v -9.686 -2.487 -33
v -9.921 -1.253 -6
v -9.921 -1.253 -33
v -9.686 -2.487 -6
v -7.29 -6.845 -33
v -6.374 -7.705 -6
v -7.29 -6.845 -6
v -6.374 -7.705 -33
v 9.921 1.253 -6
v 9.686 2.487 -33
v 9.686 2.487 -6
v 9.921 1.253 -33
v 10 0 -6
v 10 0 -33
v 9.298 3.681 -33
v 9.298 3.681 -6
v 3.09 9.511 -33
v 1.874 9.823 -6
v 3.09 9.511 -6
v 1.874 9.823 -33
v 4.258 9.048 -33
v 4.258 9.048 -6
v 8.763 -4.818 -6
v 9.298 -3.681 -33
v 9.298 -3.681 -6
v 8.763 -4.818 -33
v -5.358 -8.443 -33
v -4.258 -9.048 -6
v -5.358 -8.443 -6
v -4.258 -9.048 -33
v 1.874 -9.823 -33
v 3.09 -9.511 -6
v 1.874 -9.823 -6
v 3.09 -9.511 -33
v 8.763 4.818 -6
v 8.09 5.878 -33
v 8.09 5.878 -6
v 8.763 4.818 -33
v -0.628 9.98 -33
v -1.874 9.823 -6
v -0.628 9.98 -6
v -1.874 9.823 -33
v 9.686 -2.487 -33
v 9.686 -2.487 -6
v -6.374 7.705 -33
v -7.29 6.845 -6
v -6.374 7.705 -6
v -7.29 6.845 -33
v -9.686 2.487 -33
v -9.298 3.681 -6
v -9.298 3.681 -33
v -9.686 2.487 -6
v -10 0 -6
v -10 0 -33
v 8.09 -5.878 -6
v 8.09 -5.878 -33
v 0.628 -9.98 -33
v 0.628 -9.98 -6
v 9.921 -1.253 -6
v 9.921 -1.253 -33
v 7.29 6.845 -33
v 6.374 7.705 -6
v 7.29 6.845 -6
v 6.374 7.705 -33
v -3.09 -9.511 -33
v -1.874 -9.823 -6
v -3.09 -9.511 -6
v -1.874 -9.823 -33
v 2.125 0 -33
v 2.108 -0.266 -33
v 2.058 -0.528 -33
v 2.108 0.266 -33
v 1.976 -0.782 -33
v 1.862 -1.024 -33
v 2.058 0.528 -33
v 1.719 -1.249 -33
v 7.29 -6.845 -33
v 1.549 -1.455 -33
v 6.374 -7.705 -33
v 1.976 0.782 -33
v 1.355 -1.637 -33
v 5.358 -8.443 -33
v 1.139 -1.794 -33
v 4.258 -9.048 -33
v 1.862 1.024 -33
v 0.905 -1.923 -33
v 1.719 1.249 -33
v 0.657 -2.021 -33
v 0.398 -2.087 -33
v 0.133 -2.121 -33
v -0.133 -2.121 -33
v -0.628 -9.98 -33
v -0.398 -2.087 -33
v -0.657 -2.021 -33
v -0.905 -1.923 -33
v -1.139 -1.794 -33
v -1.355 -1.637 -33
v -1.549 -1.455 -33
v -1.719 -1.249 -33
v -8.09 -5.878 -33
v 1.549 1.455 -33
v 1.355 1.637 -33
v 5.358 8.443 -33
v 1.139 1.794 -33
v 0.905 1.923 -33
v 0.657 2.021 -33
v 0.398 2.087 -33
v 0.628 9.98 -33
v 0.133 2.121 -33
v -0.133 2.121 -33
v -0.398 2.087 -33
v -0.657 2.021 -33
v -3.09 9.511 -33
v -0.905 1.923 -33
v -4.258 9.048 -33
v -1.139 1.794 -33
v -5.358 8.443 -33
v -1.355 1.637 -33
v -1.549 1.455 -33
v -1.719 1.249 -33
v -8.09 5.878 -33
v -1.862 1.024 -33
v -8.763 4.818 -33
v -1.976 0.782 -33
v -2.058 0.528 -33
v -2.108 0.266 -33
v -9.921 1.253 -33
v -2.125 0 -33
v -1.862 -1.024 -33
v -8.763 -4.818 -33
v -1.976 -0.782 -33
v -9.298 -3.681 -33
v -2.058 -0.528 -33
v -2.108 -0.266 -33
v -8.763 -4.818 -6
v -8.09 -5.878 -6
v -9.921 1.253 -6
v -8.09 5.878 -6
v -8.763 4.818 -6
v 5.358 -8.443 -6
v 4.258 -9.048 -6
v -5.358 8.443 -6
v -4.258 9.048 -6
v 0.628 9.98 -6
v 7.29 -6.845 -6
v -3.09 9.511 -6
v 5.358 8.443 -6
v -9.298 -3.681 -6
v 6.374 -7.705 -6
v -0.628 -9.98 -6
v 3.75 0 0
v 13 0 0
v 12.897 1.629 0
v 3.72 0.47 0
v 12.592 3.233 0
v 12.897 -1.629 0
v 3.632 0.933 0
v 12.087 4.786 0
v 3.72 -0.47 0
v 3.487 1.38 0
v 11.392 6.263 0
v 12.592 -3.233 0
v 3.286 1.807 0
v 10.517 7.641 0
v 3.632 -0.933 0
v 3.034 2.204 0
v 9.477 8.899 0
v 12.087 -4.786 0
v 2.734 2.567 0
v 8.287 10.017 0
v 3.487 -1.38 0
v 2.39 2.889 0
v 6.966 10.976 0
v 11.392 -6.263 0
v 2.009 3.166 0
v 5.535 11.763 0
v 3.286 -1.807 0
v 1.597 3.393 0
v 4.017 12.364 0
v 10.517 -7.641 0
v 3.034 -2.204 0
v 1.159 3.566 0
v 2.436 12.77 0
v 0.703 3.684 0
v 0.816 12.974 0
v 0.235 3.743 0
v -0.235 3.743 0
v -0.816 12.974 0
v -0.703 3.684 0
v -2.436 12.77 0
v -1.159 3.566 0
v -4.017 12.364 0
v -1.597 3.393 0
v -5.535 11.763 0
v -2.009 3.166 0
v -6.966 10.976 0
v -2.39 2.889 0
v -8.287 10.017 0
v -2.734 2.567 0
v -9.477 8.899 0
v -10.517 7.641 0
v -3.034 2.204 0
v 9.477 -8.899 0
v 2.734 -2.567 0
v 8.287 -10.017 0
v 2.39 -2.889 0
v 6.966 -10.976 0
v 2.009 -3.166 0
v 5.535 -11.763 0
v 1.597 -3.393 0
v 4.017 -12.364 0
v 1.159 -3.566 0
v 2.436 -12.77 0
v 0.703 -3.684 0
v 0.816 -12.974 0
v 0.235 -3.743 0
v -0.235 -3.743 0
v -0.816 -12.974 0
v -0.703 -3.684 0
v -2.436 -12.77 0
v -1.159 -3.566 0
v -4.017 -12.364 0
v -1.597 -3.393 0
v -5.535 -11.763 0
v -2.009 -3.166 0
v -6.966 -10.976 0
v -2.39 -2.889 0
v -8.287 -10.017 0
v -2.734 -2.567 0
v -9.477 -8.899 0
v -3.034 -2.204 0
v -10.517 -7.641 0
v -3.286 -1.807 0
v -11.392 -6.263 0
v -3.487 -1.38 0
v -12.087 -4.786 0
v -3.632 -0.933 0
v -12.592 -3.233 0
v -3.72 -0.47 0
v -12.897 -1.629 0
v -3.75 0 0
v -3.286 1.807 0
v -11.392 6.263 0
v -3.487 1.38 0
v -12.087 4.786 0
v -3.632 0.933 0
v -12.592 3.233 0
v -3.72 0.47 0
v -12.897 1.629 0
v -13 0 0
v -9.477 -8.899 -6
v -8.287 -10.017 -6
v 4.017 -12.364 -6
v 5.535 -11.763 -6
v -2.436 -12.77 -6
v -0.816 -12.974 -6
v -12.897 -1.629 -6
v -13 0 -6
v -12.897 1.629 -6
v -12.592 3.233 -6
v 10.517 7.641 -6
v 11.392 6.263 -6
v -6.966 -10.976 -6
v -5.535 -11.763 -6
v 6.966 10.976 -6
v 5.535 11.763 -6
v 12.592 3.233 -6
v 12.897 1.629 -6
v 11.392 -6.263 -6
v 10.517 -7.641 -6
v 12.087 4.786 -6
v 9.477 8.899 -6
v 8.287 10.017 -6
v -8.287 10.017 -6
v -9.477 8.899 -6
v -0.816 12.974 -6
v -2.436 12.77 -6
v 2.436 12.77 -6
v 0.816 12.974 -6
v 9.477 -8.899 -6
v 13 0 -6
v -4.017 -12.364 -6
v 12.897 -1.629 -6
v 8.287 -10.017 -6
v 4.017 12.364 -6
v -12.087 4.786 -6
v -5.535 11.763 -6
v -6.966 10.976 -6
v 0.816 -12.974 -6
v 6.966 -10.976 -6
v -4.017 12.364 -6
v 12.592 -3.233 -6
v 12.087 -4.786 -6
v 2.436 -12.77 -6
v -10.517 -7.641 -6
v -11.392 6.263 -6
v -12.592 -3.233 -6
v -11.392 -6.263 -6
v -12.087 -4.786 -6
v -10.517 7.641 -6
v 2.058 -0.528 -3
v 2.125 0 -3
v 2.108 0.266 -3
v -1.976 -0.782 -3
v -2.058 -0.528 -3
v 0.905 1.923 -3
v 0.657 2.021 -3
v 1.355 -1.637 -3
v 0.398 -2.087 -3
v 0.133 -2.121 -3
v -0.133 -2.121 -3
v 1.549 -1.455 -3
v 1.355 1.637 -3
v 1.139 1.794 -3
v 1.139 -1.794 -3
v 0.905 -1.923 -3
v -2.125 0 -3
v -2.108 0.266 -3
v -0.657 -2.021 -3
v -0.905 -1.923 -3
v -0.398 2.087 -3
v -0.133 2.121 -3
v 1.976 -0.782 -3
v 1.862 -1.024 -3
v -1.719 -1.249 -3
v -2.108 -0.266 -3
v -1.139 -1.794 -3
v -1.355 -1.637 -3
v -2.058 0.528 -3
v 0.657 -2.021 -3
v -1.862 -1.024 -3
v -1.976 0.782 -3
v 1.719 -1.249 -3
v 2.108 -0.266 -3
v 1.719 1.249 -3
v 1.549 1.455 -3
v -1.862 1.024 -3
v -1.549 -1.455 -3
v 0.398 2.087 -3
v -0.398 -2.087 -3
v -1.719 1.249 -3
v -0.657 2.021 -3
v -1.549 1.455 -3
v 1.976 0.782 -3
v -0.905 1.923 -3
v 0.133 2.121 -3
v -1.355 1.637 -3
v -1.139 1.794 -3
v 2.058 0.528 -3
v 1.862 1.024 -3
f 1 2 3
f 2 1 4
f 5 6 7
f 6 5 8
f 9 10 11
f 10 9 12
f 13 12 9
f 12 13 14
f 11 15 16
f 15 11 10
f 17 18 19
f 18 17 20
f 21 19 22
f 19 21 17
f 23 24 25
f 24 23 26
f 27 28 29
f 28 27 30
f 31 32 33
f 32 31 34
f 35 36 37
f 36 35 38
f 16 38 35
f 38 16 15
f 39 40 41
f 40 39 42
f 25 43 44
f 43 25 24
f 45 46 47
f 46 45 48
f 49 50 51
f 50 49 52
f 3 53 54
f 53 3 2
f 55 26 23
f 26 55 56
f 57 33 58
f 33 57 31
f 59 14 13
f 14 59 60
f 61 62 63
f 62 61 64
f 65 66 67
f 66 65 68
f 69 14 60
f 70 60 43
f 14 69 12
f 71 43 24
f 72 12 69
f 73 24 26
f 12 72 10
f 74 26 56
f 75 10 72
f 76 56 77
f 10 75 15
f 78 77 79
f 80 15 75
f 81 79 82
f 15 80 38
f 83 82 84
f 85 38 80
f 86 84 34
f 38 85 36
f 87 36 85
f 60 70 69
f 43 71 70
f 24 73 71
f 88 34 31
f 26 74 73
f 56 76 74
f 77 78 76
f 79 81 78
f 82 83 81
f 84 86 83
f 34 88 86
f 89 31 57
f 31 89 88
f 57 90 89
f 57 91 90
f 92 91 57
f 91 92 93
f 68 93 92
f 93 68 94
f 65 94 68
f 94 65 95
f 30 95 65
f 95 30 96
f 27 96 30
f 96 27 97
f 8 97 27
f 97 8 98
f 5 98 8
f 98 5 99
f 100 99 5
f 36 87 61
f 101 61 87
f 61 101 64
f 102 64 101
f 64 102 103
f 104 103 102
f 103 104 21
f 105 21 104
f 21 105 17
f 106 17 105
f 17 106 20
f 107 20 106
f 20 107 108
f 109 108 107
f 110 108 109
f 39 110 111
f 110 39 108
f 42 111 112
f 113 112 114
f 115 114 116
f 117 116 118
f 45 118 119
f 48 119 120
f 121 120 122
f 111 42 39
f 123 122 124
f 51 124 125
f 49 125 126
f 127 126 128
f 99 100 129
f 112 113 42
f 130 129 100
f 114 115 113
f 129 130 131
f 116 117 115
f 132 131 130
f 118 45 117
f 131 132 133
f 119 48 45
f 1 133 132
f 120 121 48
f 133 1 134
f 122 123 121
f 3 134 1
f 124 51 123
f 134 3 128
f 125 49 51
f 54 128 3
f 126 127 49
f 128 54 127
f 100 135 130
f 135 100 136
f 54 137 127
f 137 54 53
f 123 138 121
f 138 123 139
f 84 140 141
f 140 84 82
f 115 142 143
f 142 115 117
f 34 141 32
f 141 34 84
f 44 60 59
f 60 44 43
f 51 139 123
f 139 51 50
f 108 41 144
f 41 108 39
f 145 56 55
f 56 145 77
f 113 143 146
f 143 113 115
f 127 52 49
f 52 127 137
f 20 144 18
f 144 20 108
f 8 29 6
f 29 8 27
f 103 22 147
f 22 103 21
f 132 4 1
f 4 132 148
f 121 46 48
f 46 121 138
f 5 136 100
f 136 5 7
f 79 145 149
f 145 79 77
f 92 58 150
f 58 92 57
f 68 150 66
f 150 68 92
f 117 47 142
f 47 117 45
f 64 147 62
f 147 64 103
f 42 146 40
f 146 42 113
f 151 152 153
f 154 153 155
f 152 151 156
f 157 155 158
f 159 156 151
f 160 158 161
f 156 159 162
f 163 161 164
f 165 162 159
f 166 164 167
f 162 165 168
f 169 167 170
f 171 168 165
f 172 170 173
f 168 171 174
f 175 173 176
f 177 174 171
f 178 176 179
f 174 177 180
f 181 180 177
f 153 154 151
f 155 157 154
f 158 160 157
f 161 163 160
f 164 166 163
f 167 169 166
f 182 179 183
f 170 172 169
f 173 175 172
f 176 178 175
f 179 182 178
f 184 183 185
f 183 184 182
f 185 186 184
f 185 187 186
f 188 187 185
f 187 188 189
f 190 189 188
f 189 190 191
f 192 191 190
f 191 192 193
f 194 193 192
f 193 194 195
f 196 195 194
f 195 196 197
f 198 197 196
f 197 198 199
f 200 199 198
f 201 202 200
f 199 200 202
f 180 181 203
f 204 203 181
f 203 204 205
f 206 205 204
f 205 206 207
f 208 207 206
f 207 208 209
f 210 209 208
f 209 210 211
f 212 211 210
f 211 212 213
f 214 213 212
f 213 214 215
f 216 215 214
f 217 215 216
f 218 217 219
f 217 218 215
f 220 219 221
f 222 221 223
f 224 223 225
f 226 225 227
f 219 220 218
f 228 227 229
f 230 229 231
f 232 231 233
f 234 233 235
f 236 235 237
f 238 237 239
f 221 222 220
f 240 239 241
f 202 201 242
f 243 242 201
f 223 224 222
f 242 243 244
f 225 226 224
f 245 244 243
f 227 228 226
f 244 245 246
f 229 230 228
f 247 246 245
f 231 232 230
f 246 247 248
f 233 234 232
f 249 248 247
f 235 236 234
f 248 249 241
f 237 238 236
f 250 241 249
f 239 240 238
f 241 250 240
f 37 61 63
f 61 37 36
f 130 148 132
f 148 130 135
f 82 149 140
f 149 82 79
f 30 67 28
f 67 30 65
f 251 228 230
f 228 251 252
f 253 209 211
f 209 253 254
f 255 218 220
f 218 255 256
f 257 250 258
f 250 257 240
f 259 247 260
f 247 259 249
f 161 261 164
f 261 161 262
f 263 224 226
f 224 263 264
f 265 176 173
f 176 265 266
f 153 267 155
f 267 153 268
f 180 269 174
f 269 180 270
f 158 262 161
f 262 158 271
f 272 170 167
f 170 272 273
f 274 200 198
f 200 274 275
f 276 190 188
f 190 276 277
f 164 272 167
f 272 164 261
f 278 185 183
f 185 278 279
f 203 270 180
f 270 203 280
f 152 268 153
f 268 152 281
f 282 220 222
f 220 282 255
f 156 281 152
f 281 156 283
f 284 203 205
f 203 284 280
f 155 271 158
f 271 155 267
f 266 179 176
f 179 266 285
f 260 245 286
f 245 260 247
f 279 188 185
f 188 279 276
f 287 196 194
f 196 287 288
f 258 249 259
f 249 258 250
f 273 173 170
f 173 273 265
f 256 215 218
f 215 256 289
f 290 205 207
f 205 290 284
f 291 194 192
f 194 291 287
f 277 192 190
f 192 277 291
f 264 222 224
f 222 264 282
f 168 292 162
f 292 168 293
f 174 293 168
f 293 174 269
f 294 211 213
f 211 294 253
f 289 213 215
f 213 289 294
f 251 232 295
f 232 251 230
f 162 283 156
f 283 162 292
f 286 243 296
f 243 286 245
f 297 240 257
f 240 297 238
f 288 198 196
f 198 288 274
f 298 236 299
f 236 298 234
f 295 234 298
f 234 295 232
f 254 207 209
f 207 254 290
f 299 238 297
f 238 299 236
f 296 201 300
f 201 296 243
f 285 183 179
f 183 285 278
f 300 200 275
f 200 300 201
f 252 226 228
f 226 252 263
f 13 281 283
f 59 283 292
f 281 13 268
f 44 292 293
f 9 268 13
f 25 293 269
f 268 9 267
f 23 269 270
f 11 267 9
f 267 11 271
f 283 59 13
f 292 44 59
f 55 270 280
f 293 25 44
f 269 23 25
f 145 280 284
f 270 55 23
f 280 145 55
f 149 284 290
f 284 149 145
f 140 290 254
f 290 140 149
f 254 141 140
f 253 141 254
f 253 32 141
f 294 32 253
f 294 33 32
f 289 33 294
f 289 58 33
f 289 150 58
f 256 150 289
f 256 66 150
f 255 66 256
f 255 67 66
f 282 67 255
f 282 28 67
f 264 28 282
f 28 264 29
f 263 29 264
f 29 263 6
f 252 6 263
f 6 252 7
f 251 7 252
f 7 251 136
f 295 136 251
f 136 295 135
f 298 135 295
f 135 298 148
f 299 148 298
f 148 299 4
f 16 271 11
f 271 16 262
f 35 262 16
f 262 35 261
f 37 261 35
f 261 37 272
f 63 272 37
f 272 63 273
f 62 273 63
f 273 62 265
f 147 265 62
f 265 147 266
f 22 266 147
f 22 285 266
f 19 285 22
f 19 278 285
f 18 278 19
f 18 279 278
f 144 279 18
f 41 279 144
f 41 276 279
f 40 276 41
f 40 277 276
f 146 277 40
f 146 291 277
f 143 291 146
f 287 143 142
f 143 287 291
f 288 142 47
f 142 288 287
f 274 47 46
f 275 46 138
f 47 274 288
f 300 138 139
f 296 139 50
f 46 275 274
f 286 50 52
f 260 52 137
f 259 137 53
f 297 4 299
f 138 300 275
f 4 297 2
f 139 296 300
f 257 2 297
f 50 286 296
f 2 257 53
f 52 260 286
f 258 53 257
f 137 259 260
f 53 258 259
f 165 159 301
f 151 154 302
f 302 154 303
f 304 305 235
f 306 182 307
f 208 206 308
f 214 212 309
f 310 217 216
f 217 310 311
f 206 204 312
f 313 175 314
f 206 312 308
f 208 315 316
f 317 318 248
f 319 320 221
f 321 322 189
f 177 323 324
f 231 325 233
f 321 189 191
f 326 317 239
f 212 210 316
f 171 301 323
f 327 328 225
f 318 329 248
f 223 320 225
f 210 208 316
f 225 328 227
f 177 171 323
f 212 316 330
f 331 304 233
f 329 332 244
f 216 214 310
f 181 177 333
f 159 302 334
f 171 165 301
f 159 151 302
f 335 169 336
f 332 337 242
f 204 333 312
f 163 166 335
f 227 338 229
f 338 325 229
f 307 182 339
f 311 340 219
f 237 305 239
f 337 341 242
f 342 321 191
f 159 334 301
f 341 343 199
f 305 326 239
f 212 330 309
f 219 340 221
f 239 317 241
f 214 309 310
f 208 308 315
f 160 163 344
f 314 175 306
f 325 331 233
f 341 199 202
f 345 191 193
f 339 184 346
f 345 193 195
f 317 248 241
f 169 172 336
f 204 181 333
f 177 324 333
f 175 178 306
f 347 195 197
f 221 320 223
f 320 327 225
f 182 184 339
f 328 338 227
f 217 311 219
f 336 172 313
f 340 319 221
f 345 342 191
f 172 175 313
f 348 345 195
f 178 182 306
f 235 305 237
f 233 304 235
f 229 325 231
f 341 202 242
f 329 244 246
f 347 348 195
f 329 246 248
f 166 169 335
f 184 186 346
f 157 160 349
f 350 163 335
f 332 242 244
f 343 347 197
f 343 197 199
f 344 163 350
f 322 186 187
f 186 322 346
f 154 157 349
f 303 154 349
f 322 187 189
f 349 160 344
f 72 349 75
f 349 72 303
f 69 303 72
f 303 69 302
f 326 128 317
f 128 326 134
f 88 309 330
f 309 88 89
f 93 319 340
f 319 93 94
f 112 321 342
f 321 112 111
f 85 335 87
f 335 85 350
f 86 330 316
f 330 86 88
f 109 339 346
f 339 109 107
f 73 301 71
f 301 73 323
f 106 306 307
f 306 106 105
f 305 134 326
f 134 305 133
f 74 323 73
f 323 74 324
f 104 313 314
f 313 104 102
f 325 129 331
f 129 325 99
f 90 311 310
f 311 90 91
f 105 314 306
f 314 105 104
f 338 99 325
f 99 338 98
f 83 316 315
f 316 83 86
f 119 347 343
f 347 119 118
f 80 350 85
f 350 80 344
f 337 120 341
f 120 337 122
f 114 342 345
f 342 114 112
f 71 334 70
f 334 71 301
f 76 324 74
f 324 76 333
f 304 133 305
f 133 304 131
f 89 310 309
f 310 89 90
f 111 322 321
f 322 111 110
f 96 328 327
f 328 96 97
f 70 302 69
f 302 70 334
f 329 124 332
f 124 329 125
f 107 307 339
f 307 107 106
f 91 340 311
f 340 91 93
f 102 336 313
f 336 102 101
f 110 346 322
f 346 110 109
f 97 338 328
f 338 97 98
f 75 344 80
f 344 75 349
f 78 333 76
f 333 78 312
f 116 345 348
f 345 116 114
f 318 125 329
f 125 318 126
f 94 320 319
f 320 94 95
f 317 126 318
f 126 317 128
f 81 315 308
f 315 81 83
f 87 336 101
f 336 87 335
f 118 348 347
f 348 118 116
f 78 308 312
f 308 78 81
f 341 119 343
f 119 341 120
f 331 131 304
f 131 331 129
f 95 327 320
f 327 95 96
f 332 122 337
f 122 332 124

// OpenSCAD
$fn = 50;


difference() {
	union() {
		translate(v = [0, 0, -33.0000000000]) {
			cylinder(h = 33, r = 10.0000000000);
		}
		translate(v = [0, 0, -6.0000000000]) {
			cylinder(h = 6, r = 13.0000000000);
		}
	}
	union() {
		translate(v = [0, 0, 0]) {
			rotate(a = [0, 0, 0]) {
				difference() {
					union() {
						#translate(v = [0, 0, -33.0000000000]) {
							cylinder(h = 33, r = 2.0000000000);
						}
						#translate(v = [0, 0, -3]) {
							cylinder(h = 3, r = 10.0000000000, r1 = 2.1250000000, r2 = 3.7500000000);
						}
						#translate(v = [0, 0, -33.0000000000]) {
							cylinder(h = 33, r = 2.1250000000);
						}
						#translate(v = [0, 0, -33.0000000000]) {
							cylinder(h = 33, r = 2.0000000000);
						}
					}
					union();
				}
			}
		}
	}
}
